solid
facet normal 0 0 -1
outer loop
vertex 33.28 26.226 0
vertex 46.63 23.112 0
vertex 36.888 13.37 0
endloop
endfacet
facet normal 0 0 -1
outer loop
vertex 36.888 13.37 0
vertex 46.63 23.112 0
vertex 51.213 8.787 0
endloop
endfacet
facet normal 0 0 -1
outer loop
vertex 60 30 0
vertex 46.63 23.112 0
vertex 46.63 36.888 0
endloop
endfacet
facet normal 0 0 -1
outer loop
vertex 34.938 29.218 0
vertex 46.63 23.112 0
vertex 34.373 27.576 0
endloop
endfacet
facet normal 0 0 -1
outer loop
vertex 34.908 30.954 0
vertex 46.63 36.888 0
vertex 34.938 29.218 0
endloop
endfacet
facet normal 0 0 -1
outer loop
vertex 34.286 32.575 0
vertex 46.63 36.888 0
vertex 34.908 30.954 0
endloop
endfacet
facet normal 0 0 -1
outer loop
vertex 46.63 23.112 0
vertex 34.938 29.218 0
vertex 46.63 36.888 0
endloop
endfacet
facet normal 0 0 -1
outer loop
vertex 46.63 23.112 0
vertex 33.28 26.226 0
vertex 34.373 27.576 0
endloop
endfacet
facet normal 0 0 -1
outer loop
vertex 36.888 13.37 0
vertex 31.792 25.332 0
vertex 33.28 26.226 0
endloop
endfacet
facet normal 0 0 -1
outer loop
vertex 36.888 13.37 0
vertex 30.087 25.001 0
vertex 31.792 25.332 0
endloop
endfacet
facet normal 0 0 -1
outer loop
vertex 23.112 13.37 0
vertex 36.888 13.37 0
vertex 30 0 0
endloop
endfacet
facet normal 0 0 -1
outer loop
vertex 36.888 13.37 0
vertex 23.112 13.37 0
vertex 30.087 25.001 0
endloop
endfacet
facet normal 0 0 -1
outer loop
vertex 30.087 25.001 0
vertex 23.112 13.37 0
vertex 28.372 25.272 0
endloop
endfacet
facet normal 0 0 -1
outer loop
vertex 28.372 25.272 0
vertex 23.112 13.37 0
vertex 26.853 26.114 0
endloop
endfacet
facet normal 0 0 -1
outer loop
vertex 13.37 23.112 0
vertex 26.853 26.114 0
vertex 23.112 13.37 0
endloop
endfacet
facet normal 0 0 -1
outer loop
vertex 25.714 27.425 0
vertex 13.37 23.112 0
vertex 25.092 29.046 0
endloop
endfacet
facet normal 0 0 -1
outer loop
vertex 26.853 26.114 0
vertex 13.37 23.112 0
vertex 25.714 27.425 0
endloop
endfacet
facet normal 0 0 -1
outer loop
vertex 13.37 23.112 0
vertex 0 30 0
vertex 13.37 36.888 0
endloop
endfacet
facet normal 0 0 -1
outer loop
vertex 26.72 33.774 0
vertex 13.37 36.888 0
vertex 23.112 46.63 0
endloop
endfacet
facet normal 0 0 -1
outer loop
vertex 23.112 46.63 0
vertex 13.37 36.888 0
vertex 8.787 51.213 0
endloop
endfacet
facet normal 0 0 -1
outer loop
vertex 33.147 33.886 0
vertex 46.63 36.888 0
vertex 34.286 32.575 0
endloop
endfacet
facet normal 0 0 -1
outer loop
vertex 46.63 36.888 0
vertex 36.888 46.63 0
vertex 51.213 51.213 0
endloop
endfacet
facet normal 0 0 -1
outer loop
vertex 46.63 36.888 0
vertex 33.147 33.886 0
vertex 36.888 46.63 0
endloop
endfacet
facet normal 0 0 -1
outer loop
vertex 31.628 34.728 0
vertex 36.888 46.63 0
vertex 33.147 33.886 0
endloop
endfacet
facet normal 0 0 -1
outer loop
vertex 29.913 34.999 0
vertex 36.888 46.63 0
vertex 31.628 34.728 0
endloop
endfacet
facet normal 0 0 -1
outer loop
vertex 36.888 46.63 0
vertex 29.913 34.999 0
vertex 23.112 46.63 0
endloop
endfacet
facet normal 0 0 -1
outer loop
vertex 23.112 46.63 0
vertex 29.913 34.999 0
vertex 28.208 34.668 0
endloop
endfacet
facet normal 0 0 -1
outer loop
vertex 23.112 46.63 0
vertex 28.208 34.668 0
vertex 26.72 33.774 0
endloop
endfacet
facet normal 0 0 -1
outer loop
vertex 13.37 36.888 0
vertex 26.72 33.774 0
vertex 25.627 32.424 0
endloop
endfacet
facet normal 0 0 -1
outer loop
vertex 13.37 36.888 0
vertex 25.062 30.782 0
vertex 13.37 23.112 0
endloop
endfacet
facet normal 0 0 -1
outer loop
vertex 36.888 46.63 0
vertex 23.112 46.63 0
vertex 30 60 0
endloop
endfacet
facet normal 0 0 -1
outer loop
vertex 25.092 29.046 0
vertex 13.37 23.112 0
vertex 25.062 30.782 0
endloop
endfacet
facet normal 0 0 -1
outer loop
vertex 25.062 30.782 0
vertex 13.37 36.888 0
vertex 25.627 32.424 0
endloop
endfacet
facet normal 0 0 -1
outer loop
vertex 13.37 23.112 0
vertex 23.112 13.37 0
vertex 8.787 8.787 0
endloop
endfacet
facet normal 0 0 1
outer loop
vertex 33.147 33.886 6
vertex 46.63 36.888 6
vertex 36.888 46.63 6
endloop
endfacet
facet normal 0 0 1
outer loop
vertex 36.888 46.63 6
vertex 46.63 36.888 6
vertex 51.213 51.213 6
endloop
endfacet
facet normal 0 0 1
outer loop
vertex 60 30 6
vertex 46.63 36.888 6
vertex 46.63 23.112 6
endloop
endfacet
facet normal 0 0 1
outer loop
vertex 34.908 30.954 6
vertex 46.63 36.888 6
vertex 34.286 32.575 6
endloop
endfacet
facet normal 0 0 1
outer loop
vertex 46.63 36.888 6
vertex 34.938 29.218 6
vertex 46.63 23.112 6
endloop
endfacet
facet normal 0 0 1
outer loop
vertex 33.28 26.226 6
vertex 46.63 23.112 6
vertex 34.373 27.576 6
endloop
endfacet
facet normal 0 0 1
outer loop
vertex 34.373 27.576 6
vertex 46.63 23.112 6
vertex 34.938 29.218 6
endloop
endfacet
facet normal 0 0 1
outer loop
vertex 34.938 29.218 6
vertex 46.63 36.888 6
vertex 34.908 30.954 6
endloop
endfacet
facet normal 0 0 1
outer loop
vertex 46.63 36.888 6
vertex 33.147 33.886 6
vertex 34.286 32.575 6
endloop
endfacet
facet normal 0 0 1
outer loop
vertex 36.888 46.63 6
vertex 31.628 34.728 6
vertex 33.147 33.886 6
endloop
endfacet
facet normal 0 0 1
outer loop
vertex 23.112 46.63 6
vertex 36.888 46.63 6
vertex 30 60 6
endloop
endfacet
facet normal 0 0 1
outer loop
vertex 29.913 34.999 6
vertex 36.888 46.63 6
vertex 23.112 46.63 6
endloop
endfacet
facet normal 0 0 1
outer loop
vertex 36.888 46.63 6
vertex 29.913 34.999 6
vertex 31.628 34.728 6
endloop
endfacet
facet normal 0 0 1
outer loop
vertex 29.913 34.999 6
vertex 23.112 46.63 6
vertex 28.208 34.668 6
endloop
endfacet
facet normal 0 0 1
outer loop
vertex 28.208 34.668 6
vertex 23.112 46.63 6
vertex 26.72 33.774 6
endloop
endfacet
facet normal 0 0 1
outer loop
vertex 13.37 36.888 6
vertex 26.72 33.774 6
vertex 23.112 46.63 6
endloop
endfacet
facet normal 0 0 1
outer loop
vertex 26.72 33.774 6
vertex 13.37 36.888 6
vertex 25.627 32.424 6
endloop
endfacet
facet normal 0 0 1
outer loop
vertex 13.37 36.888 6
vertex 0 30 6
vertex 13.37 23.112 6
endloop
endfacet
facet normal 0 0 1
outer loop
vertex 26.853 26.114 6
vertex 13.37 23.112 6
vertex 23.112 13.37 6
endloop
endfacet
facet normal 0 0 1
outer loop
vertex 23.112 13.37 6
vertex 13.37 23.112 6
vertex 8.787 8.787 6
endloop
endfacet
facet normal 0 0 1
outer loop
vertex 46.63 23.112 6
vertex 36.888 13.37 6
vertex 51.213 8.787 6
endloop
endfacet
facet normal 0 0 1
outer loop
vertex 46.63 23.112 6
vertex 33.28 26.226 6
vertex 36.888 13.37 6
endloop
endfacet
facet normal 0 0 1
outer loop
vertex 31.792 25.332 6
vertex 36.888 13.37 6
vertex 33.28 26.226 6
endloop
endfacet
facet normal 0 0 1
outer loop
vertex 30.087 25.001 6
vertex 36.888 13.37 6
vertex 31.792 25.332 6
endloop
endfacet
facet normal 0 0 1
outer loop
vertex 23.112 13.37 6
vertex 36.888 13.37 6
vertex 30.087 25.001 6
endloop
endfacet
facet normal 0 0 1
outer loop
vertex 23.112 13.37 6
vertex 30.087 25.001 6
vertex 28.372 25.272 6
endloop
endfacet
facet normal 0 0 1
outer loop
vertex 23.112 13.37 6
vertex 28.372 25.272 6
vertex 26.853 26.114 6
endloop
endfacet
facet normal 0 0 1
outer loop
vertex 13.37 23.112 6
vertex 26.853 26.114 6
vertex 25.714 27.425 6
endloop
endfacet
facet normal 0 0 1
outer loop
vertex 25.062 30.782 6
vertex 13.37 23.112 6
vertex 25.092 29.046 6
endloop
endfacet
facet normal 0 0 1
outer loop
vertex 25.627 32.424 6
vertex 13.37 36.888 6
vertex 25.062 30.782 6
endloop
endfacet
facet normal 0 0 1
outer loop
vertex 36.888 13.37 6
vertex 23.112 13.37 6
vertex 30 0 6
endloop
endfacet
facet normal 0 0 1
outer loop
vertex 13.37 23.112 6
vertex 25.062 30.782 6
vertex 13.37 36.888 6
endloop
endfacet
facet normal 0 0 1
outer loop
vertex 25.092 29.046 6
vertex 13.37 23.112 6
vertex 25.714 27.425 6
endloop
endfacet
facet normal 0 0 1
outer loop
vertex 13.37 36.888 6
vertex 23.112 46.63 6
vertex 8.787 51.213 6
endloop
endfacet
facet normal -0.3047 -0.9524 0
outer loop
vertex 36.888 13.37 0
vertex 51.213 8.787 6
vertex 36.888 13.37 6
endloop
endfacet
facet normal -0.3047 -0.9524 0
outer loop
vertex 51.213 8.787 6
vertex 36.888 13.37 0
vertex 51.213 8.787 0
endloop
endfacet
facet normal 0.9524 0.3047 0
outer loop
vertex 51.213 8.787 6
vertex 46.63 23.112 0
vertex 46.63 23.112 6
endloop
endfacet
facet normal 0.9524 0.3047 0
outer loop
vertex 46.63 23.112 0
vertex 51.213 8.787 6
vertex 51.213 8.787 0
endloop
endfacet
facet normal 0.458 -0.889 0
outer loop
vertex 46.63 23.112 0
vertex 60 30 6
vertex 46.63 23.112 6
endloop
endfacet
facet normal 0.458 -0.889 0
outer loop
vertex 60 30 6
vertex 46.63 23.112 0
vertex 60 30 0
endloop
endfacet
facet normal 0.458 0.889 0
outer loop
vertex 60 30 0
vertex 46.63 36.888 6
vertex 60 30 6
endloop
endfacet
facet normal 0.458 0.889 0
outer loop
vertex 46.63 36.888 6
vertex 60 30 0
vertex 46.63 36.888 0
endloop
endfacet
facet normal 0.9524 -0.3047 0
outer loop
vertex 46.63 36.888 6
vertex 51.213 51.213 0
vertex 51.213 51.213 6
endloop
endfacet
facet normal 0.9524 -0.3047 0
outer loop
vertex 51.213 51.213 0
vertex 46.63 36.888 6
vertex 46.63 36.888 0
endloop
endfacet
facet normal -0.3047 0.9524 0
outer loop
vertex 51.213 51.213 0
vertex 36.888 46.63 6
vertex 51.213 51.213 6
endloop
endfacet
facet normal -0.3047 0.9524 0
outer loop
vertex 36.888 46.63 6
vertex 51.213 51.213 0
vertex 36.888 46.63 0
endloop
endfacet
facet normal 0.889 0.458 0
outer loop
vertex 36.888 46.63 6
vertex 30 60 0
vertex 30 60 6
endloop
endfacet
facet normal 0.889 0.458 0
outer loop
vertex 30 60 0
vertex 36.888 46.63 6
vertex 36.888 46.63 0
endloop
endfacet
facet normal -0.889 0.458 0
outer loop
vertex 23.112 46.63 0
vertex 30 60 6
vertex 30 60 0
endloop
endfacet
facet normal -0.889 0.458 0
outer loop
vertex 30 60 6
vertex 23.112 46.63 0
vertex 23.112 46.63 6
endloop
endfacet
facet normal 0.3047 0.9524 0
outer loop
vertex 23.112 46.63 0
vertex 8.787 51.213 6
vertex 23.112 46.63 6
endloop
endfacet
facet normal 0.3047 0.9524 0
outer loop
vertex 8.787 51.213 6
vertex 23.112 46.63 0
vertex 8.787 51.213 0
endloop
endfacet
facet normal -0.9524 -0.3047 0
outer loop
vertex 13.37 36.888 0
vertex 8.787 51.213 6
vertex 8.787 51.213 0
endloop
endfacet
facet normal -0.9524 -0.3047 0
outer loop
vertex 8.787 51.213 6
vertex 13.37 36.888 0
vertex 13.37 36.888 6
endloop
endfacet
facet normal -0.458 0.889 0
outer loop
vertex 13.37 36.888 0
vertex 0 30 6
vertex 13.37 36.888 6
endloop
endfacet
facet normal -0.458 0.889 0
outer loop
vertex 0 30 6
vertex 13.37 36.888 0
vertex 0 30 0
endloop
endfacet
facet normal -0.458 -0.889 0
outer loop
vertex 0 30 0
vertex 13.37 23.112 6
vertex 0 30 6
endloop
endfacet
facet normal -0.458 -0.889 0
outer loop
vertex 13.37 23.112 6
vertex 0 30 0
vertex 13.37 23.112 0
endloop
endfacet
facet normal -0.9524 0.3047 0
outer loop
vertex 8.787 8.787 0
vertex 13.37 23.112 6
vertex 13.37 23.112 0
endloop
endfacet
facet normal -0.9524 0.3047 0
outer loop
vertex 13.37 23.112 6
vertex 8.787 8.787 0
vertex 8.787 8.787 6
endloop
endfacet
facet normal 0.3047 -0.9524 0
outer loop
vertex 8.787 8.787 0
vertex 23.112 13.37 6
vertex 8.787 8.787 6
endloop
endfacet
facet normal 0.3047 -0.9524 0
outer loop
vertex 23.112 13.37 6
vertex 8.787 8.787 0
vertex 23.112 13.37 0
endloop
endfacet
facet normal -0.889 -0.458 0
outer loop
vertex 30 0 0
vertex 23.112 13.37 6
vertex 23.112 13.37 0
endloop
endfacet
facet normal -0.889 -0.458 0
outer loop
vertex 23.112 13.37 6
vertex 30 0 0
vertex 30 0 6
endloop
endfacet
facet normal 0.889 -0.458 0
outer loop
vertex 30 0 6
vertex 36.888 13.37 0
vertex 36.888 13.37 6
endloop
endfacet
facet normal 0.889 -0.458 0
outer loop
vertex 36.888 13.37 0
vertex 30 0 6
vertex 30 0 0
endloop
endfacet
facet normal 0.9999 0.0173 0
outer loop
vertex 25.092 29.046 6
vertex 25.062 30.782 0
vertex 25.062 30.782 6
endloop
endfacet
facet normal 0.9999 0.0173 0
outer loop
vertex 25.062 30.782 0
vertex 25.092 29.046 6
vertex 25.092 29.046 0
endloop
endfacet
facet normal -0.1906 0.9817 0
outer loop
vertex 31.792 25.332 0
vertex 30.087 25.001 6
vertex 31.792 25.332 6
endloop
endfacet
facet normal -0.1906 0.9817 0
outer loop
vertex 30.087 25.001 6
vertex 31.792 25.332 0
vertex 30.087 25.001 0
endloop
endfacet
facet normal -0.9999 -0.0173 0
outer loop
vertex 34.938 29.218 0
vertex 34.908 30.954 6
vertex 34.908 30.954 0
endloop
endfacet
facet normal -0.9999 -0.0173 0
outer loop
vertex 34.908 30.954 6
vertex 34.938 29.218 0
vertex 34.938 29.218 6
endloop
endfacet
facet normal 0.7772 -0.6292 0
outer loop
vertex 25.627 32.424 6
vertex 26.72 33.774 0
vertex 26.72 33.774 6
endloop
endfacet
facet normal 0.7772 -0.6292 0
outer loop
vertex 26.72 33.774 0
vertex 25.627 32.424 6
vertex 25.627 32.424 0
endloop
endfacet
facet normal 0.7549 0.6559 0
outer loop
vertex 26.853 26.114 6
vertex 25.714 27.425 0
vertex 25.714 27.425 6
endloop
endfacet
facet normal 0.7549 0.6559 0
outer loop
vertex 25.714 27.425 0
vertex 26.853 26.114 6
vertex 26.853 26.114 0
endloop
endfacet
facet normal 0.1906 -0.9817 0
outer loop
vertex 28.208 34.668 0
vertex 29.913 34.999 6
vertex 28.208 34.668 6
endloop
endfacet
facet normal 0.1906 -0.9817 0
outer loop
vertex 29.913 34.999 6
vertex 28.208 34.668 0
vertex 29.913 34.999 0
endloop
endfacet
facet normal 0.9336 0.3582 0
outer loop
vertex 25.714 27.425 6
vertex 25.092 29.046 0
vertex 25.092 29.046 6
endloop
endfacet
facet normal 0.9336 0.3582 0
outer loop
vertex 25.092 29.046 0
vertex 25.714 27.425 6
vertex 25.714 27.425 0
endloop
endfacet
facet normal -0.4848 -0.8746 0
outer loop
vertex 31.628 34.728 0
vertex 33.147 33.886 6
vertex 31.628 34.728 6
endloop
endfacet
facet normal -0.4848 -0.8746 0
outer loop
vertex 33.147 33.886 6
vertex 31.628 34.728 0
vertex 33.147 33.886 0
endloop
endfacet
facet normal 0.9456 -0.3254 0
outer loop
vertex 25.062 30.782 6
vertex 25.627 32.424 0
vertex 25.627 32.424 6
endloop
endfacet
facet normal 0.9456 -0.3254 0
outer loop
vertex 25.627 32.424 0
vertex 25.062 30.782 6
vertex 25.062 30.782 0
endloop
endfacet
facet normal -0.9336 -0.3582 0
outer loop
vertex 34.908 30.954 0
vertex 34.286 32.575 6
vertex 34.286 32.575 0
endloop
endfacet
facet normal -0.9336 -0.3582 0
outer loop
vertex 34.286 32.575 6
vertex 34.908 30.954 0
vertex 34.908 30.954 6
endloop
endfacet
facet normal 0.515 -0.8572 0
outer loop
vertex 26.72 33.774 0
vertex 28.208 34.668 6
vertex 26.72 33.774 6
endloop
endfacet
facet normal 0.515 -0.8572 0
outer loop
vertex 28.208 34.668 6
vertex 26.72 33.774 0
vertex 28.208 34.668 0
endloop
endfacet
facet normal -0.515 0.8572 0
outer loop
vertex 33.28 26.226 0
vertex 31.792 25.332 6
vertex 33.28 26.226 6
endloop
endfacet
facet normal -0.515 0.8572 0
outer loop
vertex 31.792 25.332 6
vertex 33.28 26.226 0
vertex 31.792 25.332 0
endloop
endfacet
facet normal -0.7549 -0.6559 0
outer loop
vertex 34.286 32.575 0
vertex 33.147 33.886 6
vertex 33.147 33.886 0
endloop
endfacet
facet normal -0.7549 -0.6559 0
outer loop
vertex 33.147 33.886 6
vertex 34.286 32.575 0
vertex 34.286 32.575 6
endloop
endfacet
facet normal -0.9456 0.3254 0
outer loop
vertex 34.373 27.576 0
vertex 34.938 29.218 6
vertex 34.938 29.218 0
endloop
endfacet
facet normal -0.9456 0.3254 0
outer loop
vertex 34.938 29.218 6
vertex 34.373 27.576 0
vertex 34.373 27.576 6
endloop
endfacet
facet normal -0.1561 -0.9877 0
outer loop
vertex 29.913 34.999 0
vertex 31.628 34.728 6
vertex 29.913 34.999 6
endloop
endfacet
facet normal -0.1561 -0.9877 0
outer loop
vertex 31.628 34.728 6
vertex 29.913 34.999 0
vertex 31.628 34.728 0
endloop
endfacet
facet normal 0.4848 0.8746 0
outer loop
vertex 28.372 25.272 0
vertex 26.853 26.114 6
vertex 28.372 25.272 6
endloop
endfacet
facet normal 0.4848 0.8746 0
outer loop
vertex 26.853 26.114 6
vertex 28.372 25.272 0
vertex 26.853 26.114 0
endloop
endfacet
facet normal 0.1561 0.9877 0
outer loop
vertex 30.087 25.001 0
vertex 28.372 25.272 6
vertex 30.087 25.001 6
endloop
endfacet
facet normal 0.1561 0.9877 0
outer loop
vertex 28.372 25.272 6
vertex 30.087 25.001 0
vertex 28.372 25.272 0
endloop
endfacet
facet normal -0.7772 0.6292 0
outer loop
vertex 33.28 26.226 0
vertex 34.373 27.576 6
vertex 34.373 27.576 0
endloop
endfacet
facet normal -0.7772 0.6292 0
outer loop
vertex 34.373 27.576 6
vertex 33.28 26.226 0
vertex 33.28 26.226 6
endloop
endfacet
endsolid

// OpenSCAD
$fn = 32;

// ----------------------------------------------------------------------
// Star wheel: 8-point blunt, R30
// ----------------------------------------------------------------------

// --- parameters (mm) ---
n_points = 8;             // number of points / teeth
r_out = 30;               // tip radius
r_in = 18;                // root radius
bore_r = 5;               // centre bore radius
plate_t = 6;              // plate thickness, Z (extrusion height)
bore_d = 10;              // centre bore diameter

profile = [[60, 30], [46.63, 36.888], [51.213, 51.213], [36.888, 46.63], [30, 60], [23.112, 46.63], [8.787, 51.213], [13.37, 36.888], [0, 30], [13.37, 23.112], [8.787, 8.787], [23.112, 13.37], [30, 0], [36.888, 13.37], [51.213, 8.787], [46.63, 23.112]];  // primary outline, 16 points, counter clockwise
void_1 = [[34.908, 30.954], [34.286, 32.575], [33.147, 33.886], [31.628, 34.728], [29.913, 34.999], [28.208, 34.668], [26.72, 33.774], [25.627, 32.424], [25.062, 30.782], [25.092, 29.046], [25.714, 27.425], [26.853, 26.114], [28.372, 25.272], [30.087, 25.001], [31.792, 25.332], [33.28, 26.226], [34.373, 27.576], [34.938, 29.218]];  // centre bore, 18 points

// --- the one profile operation ---
difference() {
  linear_extrude(height = plate_t) polygon(points = profile);
  translate([0, 0, -1])
    linear_extrude(height = plate_t + 2) polygon(points = void_1);
}
